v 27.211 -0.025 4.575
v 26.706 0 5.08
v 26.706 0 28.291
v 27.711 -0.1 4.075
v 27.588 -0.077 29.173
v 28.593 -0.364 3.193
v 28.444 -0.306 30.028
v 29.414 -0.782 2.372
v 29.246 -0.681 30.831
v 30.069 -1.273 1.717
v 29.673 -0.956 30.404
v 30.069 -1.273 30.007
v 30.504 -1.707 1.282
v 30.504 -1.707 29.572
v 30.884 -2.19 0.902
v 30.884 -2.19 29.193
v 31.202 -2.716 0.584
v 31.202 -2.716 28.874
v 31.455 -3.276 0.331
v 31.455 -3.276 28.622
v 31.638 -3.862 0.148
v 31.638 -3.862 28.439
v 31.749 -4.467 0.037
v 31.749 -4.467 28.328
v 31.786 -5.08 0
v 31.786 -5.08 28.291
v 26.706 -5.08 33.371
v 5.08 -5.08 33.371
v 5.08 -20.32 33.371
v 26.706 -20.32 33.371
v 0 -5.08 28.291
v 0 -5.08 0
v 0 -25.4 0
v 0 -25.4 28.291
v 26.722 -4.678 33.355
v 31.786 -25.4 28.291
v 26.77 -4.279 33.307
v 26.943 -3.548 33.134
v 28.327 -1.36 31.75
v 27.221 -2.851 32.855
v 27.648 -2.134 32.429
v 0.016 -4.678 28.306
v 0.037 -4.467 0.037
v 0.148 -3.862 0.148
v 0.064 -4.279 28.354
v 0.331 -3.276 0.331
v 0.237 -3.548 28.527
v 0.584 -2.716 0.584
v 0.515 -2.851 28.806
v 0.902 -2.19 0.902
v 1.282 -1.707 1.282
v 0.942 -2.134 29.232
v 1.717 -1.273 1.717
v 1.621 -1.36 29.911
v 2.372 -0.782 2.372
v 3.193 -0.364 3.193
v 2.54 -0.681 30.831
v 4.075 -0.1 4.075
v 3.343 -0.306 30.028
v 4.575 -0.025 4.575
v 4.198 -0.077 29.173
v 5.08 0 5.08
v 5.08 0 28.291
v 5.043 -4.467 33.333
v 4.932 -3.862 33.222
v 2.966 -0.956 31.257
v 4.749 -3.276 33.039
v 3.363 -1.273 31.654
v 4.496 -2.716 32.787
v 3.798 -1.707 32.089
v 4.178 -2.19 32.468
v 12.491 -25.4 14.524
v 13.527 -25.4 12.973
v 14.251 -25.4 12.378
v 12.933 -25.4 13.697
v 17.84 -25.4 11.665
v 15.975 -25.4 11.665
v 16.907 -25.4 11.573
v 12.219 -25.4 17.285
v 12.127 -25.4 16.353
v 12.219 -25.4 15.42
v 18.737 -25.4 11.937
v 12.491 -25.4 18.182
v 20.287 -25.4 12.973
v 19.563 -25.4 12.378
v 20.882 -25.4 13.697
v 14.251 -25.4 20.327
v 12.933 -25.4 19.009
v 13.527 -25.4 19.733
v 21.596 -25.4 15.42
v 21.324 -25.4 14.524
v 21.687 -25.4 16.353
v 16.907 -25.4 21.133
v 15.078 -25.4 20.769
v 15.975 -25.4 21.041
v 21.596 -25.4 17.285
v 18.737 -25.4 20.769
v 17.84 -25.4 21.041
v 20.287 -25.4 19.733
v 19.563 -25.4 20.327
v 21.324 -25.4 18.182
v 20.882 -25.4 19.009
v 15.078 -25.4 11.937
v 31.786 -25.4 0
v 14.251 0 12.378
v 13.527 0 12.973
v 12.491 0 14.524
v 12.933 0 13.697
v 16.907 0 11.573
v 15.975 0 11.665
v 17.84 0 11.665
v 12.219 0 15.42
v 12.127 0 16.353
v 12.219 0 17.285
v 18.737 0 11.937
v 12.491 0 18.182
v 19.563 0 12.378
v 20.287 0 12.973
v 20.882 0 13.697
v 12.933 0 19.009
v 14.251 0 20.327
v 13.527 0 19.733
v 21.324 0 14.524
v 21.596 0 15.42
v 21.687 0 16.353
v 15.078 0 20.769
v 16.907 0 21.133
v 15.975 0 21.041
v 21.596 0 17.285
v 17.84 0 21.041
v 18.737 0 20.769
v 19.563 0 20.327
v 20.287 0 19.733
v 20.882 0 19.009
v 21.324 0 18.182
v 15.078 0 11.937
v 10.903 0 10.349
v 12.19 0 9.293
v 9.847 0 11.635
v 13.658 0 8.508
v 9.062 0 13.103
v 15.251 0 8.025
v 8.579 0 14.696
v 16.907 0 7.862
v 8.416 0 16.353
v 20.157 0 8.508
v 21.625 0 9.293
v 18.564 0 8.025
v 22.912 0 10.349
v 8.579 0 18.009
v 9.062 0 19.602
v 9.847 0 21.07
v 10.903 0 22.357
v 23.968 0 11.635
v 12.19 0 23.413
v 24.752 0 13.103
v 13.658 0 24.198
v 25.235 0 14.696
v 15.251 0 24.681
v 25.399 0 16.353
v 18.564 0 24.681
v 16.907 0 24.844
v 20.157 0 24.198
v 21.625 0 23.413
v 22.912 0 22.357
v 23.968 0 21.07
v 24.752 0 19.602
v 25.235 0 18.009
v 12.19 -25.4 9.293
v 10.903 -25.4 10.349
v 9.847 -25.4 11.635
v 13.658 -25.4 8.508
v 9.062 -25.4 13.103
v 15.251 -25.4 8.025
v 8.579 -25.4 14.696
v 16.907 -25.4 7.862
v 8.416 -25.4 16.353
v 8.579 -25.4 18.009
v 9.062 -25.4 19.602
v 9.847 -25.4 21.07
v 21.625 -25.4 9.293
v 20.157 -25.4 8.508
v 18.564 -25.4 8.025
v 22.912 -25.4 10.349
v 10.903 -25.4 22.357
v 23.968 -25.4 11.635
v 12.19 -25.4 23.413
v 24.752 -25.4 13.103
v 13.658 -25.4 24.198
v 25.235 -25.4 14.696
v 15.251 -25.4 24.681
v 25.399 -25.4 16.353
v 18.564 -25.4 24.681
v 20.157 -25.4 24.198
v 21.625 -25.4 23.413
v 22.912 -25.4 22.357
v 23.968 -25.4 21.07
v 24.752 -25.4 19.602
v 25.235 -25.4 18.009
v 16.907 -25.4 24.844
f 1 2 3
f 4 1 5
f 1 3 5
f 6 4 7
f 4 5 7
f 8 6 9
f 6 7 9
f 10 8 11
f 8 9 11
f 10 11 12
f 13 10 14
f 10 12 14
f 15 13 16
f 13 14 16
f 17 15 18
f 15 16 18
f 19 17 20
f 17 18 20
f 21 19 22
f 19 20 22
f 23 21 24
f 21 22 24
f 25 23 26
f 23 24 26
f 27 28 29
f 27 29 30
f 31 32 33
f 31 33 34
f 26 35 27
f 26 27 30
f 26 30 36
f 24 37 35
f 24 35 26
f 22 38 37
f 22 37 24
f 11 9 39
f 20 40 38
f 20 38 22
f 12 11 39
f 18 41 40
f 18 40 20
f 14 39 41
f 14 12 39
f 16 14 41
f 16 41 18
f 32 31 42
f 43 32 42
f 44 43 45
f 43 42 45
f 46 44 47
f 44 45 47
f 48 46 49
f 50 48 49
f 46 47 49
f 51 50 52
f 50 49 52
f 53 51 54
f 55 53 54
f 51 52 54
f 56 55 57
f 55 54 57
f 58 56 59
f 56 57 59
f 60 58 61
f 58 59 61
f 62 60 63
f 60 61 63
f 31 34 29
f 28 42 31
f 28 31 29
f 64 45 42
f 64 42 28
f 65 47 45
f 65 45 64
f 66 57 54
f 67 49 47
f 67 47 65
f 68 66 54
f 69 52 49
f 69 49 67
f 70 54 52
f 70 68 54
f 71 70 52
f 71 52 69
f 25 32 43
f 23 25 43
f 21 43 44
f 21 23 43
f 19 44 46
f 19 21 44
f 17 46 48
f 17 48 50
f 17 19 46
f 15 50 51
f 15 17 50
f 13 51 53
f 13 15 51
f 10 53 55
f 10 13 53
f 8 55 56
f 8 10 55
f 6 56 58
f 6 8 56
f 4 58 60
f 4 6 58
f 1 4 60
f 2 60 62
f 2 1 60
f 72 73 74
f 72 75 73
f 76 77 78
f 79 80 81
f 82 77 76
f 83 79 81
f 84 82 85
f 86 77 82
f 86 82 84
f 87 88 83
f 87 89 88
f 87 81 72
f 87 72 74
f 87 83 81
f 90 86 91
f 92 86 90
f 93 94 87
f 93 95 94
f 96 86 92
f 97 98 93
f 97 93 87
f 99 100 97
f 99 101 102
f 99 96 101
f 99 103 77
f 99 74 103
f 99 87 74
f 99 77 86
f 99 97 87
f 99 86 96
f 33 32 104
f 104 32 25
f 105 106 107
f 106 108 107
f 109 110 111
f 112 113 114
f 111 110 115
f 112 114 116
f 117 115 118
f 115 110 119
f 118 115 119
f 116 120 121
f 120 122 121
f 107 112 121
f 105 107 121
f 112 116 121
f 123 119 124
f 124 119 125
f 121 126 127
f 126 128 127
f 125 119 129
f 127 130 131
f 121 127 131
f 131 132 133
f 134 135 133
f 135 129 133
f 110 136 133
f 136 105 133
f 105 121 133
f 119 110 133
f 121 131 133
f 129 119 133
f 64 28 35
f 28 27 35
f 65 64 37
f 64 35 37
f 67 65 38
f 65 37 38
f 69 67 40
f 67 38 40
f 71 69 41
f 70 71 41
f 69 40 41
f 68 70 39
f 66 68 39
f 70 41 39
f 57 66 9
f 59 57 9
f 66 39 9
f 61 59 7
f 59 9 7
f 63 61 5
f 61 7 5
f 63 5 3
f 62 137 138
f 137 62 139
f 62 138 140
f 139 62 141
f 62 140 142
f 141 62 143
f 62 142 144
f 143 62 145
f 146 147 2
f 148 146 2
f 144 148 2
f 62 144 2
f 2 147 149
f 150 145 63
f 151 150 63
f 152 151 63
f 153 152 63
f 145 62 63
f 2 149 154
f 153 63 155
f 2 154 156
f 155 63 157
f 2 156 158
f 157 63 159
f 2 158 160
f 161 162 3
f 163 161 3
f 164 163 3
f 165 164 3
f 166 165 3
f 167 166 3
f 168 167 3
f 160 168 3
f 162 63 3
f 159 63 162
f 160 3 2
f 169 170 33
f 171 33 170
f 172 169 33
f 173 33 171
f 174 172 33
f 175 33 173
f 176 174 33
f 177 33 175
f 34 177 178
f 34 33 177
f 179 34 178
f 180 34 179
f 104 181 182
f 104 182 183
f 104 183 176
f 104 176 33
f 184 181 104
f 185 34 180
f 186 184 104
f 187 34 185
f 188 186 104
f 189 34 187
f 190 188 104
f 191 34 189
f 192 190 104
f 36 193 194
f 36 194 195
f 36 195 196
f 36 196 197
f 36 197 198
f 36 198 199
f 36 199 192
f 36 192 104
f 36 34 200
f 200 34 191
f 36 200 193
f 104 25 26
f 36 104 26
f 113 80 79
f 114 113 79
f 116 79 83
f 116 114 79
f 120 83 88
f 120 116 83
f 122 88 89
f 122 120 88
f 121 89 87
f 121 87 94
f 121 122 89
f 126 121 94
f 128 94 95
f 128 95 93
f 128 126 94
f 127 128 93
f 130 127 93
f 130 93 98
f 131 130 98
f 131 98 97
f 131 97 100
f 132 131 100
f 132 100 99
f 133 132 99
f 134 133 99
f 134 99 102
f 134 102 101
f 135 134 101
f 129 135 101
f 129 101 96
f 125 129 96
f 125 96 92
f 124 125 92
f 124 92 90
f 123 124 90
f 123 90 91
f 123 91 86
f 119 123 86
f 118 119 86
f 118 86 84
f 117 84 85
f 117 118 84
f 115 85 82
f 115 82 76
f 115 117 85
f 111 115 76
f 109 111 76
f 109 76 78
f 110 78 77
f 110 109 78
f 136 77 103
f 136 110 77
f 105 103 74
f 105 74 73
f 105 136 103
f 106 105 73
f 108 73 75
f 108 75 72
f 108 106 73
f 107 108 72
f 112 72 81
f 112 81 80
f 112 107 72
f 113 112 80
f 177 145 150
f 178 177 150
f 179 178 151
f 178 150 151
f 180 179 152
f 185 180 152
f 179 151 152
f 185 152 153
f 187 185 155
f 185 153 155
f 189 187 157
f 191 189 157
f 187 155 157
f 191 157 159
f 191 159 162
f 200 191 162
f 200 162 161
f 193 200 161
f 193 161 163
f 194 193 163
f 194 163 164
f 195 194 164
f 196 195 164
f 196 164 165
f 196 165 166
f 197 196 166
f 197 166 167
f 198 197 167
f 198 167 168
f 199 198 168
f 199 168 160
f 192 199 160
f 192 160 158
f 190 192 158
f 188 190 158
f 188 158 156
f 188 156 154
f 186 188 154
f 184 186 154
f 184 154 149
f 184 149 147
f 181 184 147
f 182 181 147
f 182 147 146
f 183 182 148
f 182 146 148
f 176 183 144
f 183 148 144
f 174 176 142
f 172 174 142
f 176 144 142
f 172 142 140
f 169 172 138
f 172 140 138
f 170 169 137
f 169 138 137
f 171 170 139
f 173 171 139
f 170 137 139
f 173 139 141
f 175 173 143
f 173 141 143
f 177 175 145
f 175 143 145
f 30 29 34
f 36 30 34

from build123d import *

# Parameters (mm, degrees)
F0_W        = 31.7861549556
F0_H        = 33.3705097437
F1_DEPTH    = 25.4
F2_R        = 8.4913873206
F2_R_2      = 4.7802100494
F3_DEPTH    = 25.401
F4_R        = 5.08
F5_T1_DEPTH = 57.9144541134
F5_T3_DEPTH = 46.4482991577


# Not quite as in the source:
# - a fillet or chamfer that OpenCascade refuses, or shapes differently, is made with other operations: its cross-section is extruded or revolved along the edge and cut away or added


with BuildPart() as f1:
    # F0 (on Front) → F1 (new body)
    with BuildSketch(Plane.XZ):
        with Locations((15.8930774778, 16.6852548718)):
            Rectangle(F0_W, F0_H)
    extrude(amount=F1_DEPTH)

    # F2 (on face) → F3 (cut, through all)
    with BuildSketch(Plane(origin=(0, 0, 0), x_dir=(-1, 0, 0), z_dir=(0, 1, 0))):
        with Locations((-16.9071946293, 16.3528900594)):
            Circle(F2_R)
        with Locations((-16.9071946293, 16.3528900594)):
            Circle(F2_R_2, mode=Mode.SUBTRACT)
    extrude(amount=-F3_DEPTH, mode=Mode.SUBTRACT)

    # F4
    f4_edges = [f1.edges().sort_by_distance(p)[0] for p in [
        (15.893077, 0, 33.37051),
        (0, 0, 16.685255),
        (15.893077, 0, 0),
        (31.786155, 0, 16.685255),
    ]]
    fillet(f4_edges, radius=F4_R)

    # F5: chamfer of 5.08 on 4 edges, made by hand

    # F5_s2 → F5_t1 (cut)
    with BuildSketch(Plane.YZ.offset(-13.0641495789)):
        Polygon((-20.32, 33.3705097437), (-25.4, 28.2905097437), (-25.4, 33.3705097437), align=None)
    extrude(amount=F5_T1_DEPTH, mode=Mode.SUBTRACT)

    # F5_s4 → F5_t3 (cut)
    with BuildSketch(Plane.XZ.offset(-7.9841495789)):
        Polygon((26.7061549556, 33.3705097437), (31.7861549556, 28.2905097437), (31.7861549556, 33.3705097437), align=None)
        Polygon((0, 28.2905097437), (5.08, 33.3705097437), (0, 33.3705097437), align=None)
    extrude(amount=F5_T3_DEPTH, mode=Mode.SUBTRACT)


solid = f1.part
